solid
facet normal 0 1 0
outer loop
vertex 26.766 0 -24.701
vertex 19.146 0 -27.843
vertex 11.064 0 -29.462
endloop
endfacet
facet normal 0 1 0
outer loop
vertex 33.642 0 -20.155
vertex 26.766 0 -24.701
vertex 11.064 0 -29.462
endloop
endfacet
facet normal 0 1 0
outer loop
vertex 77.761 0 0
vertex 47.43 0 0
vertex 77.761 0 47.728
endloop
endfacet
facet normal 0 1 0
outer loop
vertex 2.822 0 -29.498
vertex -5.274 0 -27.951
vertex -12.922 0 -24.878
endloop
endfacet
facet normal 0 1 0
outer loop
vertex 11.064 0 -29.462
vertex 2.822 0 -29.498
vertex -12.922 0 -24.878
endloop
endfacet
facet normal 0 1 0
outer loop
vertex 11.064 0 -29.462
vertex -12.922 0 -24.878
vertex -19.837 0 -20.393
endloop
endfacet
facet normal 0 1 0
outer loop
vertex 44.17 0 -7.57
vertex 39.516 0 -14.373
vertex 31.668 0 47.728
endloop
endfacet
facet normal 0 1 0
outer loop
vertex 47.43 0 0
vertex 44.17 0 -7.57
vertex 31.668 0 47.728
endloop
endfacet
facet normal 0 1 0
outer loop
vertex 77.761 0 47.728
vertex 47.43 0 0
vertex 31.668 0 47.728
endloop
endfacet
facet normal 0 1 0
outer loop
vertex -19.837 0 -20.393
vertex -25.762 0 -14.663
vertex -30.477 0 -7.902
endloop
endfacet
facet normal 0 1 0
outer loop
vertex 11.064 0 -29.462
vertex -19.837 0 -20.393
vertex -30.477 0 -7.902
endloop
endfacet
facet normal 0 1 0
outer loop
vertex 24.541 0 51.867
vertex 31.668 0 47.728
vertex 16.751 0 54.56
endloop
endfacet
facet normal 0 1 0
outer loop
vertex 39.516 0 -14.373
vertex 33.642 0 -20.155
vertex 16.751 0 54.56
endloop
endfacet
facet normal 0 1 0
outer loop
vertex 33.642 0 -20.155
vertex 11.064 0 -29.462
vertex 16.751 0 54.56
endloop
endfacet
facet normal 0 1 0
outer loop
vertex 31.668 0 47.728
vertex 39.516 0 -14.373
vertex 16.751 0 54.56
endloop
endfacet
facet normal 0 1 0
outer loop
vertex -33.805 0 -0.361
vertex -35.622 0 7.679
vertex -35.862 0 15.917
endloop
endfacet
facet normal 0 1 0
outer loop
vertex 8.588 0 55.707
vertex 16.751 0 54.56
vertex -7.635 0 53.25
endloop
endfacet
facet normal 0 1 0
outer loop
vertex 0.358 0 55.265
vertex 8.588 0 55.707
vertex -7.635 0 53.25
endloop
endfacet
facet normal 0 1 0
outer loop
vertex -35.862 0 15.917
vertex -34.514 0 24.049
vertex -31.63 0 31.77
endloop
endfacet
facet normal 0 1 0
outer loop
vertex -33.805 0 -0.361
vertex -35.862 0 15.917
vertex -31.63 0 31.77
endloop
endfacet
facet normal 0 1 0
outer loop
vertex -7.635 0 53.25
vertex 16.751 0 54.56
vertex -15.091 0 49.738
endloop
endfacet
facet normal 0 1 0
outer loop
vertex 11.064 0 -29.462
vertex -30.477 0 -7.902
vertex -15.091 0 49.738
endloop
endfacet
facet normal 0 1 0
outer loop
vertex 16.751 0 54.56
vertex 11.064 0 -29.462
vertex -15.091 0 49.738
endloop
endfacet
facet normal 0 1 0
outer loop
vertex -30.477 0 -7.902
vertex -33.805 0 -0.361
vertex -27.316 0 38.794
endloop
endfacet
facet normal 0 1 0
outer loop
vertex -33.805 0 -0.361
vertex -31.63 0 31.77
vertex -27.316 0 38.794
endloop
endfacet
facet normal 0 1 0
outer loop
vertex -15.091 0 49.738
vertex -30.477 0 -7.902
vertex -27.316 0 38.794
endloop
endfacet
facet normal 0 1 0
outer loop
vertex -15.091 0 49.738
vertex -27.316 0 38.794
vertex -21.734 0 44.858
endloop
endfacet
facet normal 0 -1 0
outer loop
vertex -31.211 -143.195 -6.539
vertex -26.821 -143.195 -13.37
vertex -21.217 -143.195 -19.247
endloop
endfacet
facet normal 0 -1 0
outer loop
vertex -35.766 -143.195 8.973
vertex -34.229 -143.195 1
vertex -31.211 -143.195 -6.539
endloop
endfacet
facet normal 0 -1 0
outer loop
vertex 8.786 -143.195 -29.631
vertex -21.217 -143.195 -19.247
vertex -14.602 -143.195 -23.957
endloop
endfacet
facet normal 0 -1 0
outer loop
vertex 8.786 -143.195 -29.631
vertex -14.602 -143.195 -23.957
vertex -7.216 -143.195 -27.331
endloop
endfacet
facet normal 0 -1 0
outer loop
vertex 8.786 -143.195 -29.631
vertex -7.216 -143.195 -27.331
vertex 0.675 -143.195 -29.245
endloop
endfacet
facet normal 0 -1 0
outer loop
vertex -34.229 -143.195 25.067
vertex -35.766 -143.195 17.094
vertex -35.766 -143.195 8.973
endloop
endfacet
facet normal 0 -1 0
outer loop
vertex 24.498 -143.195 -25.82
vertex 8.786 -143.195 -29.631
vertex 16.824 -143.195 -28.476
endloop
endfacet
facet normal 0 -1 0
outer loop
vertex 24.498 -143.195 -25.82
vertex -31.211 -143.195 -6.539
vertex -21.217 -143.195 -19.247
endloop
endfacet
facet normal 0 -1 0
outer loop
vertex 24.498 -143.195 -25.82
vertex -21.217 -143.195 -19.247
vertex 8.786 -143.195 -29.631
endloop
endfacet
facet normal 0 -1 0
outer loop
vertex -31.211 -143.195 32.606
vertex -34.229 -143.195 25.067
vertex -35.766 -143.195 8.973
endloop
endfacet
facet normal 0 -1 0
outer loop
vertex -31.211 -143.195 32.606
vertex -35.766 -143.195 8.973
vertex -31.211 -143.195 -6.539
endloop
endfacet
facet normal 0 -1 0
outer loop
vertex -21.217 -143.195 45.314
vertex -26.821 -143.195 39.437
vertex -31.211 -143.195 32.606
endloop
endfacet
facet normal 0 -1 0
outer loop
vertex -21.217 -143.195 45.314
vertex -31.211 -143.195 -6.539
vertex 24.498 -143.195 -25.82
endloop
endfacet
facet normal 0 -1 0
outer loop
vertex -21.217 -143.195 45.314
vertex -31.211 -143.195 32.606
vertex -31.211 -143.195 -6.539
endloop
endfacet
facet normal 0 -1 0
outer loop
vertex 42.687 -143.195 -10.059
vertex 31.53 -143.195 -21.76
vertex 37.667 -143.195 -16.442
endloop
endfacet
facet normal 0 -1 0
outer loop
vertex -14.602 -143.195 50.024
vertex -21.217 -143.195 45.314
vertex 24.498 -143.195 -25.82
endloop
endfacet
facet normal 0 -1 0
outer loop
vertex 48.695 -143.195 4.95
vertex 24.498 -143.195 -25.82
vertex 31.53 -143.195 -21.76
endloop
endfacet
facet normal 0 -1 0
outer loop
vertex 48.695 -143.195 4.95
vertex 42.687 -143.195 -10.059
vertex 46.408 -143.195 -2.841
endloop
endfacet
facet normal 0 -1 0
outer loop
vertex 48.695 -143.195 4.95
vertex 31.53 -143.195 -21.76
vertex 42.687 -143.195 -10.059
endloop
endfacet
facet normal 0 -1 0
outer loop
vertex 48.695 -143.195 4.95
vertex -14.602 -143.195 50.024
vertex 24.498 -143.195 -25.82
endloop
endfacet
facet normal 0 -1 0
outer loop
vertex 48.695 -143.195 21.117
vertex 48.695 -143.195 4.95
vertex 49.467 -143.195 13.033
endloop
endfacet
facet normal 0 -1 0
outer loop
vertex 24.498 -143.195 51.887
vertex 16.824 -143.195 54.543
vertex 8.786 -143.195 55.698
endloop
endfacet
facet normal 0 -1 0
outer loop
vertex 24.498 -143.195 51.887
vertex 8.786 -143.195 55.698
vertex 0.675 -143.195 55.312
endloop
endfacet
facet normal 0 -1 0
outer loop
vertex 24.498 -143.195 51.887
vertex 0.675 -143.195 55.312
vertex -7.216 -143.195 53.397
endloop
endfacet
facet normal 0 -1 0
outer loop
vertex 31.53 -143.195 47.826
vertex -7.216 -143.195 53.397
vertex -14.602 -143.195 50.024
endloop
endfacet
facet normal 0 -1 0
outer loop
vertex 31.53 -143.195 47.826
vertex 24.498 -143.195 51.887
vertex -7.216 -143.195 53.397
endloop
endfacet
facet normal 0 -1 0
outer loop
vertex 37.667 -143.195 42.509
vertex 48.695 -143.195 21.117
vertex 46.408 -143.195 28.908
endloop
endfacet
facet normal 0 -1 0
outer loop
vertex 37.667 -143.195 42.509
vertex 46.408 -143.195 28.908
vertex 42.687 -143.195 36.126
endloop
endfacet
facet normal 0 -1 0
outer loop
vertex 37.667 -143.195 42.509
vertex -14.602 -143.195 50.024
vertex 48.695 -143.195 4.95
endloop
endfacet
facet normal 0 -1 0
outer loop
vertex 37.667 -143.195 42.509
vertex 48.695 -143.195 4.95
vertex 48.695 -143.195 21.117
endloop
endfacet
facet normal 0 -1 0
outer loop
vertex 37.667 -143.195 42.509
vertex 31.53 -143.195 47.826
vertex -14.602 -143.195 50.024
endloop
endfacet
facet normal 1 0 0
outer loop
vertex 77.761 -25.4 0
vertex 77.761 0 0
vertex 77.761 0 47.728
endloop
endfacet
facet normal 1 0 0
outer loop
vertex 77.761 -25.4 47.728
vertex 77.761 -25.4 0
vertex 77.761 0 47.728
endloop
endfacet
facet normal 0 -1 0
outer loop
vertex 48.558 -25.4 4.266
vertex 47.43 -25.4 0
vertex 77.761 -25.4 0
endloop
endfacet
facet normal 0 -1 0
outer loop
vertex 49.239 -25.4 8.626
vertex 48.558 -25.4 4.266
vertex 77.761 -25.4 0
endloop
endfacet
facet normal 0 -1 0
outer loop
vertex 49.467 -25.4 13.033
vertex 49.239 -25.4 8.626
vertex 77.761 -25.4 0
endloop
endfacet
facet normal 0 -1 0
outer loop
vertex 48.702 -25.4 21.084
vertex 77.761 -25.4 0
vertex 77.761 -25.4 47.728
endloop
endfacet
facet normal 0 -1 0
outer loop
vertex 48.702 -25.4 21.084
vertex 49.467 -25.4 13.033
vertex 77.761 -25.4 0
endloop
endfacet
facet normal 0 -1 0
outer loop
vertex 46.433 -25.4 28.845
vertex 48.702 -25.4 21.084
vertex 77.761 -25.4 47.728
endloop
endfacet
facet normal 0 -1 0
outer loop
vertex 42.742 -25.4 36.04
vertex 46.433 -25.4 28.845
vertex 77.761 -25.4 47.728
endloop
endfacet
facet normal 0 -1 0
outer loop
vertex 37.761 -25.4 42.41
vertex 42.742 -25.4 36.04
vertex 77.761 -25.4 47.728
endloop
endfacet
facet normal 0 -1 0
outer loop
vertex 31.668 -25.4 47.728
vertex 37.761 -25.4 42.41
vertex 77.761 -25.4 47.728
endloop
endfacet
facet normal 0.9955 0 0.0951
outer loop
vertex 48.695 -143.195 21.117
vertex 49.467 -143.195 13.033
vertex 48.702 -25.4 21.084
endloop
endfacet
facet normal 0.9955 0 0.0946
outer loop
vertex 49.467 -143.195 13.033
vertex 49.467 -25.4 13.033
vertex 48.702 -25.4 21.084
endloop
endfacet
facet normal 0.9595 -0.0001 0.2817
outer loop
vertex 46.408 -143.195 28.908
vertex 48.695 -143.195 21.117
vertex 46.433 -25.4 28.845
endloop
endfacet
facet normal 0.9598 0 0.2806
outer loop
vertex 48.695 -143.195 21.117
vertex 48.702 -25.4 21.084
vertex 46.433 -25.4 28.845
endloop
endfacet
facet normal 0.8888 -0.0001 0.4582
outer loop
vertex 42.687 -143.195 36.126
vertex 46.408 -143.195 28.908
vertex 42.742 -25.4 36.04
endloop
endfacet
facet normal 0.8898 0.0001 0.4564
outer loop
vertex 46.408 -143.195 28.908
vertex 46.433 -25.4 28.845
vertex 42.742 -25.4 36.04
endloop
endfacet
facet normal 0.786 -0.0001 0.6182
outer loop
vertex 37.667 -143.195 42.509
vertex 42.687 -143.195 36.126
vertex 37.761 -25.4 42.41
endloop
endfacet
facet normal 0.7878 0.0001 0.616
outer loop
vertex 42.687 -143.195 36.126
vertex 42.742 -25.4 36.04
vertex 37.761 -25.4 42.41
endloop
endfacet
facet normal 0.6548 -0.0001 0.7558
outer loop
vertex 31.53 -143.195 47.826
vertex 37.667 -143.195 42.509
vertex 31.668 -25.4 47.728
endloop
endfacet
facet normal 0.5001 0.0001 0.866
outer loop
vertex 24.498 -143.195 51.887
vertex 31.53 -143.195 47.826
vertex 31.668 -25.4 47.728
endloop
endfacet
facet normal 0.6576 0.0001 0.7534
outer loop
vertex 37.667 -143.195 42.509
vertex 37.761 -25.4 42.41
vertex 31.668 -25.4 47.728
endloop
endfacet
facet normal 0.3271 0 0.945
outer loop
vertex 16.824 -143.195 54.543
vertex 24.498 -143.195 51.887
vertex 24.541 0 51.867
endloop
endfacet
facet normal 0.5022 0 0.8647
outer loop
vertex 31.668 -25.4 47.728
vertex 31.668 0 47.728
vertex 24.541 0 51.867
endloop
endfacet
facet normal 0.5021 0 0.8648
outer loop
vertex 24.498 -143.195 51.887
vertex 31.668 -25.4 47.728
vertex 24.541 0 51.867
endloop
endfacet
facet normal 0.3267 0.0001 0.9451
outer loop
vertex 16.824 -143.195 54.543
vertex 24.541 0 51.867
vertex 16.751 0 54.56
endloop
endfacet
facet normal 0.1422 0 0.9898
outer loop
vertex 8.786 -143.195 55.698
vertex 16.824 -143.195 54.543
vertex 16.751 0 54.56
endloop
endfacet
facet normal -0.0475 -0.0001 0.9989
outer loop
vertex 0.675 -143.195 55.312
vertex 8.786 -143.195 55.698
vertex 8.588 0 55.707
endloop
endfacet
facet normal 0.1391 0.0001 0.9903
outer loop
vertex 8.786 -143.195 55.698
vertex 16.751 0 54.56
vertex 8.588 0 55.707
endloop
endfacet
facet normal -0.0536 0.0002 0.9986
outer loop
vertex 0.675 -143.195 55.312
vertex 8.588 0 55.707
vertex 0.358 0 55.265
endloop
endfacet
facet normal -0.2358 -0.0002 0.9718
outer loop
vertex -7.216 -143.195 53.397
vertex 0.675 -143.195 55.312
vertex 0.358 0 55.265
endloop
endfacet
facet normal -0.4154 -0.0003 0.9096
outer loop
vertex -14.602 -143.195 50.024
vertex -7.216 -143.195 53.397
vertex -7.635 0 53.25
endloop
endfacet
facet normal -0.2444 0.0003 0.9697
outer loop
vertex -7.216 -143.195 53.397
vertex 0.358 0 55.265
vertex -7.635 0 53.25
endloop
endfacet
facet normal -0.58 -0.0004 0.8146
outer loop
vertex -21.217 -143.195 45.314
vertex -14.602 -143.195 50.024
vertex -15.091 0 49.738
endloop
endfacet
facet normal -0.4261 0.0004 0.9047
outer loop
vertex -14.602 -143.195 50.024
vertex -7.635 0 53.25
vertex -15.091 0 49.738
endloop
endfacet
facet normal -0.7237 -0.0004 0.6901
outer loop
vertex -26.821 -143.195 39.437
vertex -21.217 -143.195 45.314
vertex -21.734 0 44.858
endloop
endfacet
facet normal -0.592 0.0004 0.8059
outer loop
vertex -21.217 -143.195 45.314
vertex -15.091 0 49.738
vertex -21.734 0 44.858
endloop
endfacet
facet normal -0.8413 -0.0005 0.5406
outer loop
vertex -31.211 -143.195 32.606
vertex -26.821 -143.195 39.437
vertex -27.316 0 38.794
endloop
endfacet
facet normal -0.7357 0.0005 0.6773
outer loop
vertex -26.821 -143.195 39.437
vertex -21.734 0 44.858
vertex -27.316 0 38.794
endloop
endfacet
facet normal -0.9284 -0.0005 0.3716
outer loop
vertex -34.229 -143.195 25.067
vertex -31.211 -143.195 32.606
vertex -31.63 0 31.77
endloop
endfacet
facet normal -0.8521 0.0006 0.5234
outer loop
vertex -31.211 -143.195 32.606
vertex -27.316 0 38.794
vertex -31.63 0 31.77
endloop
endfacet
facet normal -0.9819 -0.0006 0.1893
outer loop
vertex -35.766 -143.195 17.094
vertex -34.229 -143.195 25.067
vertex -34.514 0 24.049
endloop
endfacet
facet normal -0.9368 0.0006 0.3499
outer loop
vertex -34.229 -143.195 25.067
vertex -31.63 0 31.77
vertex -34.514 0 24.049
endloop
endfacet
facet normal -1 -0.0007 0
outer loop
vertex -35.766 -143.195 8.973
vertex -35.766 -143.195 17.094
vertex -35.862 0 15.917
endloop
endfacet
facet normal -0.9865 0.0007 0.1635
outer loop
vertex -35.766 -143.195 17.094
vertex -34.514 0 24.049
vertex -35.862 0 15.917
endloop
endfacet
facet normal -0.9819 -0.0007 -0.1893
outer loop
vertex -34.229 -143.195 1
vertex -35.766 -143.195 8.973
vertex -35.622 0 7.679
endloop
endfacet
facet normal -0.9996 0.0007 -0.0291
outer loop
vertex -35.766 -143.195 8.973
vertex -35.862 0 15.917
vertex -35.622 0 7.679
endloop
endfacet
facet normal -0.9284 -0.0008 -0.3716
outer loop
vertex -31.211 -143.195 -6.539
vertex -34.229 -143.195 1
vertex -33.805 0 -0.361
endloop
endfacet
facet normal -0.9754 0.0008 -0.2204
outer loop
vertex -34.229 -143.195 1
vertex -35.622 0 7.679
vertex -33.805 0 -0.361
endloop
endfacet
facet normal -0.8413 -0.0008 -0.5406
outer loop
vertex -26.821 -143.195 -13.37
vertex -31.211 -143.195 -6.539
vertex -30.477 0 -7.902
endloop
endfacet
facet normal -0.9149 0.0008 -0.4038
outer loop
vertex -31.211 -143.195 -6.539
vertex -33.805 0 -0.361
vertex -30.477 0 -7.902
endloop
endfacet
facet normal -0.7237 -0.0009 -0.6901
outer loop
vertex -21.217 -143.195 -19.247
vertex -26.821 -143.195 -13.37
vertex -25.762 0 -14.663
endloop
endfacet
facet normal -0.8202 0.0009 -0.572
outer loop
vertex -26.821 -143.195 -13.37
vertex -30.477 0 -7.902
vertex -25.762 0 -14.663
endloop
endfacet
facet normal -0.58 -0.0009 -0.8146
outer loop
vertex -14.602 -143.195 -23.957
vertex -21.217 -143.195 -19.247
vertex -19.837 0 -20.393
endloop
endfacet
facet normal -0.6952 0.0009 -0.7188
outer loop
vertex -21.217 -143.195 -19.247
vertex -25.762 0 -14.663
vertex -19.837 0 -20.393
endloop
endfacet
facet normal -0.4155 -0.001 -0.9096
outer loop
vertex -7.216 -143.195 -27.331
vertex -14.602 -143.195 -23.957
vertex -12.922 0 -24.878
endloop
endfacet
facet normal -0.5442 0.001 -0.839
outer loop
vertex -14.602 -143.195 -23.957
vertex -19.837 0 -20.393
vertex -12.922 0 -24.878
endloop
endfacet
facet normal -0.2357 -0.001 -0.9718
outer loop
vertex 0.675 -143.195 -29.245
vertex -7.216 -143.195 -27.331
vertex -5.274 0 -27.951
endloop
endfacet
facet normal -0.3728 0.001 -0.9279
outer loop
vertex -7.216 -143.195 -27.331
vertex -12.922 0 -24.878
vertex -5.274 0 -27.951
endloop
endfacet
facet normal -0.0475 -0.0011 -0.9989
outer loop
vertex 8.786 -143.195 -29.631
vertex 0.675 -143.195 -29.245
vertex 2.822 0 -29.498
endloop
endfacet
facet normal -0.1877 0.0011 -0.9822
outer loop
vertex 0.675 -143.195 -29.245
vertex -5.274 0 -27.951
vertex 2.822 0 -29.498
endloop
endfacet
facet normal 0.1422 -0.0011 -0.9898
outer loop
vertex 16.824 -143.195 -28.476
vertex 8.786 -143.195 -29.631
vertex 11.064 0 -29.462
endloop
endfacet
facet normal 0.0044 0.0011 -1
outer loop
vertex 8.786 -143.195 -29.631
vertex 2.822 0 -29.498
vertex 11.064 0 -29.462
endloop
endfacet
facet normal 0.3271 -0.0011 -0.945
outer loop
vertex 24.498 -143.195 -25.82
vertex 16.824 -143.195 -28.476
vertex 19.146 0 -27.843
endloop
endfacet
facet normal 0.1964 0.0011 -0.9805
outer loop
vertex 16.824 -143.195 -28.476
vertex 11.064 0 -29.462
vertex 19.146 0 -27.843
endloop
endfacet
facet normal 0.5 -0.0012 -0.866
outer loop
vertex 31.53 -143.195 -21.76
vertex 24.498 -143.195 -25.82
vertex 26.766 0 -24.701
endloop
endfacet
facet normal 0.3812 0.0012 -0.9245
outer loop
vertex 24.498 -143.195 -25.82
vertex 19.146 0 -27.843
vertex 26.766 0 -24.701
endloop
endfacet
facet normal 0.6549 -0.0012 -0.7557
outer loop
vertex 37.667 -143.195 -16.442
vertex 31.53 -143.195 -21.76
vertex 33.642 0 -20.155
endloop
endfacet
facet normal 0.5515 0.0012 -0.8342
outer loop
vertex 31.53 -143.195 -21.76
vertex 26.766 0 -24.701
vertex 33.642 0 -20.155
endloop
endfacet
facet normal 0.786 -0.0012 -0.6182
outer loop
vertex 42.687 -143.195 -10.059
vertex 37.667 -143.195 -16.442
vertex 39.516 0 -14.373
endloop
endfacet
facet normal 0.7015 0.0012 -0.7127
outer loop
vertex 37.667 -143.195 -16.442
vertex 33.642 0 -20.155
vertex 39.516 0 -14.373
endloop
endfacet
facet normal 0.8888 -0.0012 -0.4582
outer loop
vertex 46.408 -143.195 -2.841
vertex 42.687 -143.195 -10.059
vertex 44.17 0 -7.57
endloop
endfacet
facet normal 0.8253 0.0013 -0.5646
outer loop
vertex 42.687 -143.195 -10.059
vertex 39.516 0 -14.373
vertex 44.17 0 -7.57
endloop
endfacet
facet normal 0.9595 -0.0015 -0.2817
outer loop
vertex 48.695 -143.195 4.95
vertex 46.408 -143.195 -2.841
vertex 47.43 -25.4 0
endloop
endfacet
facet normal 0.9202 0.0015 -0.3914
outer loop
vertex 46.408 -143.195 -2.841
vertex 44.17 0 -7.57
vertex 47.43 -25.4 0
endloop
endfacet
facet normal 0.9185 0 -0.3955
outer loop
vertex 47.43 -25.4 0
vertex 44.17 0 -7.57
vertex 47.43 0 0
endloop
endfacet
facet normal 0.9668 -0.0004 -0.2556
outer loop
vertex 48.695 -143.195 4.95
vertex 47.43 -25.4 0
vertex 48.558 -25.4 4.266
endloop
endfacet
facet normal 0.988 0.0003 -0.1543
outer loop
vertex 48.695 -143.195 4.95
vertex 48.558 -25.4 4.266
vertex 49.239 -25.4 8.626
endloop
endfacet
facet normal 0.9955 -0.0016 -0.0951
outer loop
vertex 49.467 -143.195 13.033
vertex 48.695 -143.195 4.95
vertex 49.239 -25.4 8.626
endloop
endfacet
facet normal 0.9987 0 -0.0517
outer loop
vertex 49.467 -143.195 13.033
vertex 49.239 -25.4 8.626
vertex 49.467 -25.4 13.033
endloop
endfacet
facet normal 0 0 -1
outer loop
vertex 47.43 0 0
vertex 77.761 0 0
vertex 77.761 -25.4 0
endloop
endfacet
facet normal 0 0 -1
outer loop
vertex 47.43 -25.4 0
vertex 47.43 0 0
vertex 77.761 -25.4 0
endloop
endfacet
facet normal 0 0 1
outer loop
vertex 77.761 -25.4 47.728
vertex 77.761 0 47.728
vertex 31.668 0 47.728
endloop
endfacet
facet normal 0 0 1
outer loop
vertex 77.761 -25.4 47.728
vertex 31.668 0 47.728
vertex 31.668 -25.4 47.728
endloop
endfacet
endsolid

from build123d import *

# Parameters (mm, degrees)
F0_R      = 42.713148629
F1_DEPTH  = 66.9949576259
F1_FACE_R = 42.713148629
F2_W      = 52.3607060313
F2_H      = 47.7277636528
F3_DEPTH  = 25.4
F4_DEPTH  = 25.4
F5_DEPTH  = 25.4
F6_DEPTH  = 25.4


with BuildPart() as f1:
    # F0 (on Front) → F1 (new body)
    with BuildSketch(Plane.XZ):
        with Locations((6.7541077733, 13.033375144)):
            Circle(F0_R)
    extrude(amount=F1_DEPTH)

    # F1_face (on face) + F2 (on Front) → F3 (join)
    with BuildSketch(Plane(origin=(6.7541077733, -66.9949576259, 13.033375144), x_dir=(1, 0, 0), z_dir=(0, -1, 0))):
        Circle(F1_FACE_R)
    with BuildSketch(Plane.XZ):
        with Locations((26.1803530157, 23.8638818264)):
            Rectangle(F2_W, F2_H)
    extrude(amount=F3_DEPTH)

    # F4 (add): a face of the model
    f4_faces = [f1.faces().sort_by_distance(p)[0] for p in [
        (52.3607060313, -12.7, 23.8638818264),
    ]]
    extrude(f4_faces, amount=F4_DEPTH)

    # F5 (add): a face of the model
    f5_faces = [f1.faces().sort_by_distance(p)[0] for p in [
        (6.7541077733, -92.3949576259, 13.033375144),
    ]]
    extrude(f5_faces, amount=F5_DEPTH)

    # F6 (add): a face of the model
    f6_faces = [f1.faces().sort_by_distance(p)[0] for p in [
        (6.7541077733, -117.7949576259, 13.033375144),
    ]]
    extrude(f6_faces, amount=F6_DEPTH)


solid = f1.part
